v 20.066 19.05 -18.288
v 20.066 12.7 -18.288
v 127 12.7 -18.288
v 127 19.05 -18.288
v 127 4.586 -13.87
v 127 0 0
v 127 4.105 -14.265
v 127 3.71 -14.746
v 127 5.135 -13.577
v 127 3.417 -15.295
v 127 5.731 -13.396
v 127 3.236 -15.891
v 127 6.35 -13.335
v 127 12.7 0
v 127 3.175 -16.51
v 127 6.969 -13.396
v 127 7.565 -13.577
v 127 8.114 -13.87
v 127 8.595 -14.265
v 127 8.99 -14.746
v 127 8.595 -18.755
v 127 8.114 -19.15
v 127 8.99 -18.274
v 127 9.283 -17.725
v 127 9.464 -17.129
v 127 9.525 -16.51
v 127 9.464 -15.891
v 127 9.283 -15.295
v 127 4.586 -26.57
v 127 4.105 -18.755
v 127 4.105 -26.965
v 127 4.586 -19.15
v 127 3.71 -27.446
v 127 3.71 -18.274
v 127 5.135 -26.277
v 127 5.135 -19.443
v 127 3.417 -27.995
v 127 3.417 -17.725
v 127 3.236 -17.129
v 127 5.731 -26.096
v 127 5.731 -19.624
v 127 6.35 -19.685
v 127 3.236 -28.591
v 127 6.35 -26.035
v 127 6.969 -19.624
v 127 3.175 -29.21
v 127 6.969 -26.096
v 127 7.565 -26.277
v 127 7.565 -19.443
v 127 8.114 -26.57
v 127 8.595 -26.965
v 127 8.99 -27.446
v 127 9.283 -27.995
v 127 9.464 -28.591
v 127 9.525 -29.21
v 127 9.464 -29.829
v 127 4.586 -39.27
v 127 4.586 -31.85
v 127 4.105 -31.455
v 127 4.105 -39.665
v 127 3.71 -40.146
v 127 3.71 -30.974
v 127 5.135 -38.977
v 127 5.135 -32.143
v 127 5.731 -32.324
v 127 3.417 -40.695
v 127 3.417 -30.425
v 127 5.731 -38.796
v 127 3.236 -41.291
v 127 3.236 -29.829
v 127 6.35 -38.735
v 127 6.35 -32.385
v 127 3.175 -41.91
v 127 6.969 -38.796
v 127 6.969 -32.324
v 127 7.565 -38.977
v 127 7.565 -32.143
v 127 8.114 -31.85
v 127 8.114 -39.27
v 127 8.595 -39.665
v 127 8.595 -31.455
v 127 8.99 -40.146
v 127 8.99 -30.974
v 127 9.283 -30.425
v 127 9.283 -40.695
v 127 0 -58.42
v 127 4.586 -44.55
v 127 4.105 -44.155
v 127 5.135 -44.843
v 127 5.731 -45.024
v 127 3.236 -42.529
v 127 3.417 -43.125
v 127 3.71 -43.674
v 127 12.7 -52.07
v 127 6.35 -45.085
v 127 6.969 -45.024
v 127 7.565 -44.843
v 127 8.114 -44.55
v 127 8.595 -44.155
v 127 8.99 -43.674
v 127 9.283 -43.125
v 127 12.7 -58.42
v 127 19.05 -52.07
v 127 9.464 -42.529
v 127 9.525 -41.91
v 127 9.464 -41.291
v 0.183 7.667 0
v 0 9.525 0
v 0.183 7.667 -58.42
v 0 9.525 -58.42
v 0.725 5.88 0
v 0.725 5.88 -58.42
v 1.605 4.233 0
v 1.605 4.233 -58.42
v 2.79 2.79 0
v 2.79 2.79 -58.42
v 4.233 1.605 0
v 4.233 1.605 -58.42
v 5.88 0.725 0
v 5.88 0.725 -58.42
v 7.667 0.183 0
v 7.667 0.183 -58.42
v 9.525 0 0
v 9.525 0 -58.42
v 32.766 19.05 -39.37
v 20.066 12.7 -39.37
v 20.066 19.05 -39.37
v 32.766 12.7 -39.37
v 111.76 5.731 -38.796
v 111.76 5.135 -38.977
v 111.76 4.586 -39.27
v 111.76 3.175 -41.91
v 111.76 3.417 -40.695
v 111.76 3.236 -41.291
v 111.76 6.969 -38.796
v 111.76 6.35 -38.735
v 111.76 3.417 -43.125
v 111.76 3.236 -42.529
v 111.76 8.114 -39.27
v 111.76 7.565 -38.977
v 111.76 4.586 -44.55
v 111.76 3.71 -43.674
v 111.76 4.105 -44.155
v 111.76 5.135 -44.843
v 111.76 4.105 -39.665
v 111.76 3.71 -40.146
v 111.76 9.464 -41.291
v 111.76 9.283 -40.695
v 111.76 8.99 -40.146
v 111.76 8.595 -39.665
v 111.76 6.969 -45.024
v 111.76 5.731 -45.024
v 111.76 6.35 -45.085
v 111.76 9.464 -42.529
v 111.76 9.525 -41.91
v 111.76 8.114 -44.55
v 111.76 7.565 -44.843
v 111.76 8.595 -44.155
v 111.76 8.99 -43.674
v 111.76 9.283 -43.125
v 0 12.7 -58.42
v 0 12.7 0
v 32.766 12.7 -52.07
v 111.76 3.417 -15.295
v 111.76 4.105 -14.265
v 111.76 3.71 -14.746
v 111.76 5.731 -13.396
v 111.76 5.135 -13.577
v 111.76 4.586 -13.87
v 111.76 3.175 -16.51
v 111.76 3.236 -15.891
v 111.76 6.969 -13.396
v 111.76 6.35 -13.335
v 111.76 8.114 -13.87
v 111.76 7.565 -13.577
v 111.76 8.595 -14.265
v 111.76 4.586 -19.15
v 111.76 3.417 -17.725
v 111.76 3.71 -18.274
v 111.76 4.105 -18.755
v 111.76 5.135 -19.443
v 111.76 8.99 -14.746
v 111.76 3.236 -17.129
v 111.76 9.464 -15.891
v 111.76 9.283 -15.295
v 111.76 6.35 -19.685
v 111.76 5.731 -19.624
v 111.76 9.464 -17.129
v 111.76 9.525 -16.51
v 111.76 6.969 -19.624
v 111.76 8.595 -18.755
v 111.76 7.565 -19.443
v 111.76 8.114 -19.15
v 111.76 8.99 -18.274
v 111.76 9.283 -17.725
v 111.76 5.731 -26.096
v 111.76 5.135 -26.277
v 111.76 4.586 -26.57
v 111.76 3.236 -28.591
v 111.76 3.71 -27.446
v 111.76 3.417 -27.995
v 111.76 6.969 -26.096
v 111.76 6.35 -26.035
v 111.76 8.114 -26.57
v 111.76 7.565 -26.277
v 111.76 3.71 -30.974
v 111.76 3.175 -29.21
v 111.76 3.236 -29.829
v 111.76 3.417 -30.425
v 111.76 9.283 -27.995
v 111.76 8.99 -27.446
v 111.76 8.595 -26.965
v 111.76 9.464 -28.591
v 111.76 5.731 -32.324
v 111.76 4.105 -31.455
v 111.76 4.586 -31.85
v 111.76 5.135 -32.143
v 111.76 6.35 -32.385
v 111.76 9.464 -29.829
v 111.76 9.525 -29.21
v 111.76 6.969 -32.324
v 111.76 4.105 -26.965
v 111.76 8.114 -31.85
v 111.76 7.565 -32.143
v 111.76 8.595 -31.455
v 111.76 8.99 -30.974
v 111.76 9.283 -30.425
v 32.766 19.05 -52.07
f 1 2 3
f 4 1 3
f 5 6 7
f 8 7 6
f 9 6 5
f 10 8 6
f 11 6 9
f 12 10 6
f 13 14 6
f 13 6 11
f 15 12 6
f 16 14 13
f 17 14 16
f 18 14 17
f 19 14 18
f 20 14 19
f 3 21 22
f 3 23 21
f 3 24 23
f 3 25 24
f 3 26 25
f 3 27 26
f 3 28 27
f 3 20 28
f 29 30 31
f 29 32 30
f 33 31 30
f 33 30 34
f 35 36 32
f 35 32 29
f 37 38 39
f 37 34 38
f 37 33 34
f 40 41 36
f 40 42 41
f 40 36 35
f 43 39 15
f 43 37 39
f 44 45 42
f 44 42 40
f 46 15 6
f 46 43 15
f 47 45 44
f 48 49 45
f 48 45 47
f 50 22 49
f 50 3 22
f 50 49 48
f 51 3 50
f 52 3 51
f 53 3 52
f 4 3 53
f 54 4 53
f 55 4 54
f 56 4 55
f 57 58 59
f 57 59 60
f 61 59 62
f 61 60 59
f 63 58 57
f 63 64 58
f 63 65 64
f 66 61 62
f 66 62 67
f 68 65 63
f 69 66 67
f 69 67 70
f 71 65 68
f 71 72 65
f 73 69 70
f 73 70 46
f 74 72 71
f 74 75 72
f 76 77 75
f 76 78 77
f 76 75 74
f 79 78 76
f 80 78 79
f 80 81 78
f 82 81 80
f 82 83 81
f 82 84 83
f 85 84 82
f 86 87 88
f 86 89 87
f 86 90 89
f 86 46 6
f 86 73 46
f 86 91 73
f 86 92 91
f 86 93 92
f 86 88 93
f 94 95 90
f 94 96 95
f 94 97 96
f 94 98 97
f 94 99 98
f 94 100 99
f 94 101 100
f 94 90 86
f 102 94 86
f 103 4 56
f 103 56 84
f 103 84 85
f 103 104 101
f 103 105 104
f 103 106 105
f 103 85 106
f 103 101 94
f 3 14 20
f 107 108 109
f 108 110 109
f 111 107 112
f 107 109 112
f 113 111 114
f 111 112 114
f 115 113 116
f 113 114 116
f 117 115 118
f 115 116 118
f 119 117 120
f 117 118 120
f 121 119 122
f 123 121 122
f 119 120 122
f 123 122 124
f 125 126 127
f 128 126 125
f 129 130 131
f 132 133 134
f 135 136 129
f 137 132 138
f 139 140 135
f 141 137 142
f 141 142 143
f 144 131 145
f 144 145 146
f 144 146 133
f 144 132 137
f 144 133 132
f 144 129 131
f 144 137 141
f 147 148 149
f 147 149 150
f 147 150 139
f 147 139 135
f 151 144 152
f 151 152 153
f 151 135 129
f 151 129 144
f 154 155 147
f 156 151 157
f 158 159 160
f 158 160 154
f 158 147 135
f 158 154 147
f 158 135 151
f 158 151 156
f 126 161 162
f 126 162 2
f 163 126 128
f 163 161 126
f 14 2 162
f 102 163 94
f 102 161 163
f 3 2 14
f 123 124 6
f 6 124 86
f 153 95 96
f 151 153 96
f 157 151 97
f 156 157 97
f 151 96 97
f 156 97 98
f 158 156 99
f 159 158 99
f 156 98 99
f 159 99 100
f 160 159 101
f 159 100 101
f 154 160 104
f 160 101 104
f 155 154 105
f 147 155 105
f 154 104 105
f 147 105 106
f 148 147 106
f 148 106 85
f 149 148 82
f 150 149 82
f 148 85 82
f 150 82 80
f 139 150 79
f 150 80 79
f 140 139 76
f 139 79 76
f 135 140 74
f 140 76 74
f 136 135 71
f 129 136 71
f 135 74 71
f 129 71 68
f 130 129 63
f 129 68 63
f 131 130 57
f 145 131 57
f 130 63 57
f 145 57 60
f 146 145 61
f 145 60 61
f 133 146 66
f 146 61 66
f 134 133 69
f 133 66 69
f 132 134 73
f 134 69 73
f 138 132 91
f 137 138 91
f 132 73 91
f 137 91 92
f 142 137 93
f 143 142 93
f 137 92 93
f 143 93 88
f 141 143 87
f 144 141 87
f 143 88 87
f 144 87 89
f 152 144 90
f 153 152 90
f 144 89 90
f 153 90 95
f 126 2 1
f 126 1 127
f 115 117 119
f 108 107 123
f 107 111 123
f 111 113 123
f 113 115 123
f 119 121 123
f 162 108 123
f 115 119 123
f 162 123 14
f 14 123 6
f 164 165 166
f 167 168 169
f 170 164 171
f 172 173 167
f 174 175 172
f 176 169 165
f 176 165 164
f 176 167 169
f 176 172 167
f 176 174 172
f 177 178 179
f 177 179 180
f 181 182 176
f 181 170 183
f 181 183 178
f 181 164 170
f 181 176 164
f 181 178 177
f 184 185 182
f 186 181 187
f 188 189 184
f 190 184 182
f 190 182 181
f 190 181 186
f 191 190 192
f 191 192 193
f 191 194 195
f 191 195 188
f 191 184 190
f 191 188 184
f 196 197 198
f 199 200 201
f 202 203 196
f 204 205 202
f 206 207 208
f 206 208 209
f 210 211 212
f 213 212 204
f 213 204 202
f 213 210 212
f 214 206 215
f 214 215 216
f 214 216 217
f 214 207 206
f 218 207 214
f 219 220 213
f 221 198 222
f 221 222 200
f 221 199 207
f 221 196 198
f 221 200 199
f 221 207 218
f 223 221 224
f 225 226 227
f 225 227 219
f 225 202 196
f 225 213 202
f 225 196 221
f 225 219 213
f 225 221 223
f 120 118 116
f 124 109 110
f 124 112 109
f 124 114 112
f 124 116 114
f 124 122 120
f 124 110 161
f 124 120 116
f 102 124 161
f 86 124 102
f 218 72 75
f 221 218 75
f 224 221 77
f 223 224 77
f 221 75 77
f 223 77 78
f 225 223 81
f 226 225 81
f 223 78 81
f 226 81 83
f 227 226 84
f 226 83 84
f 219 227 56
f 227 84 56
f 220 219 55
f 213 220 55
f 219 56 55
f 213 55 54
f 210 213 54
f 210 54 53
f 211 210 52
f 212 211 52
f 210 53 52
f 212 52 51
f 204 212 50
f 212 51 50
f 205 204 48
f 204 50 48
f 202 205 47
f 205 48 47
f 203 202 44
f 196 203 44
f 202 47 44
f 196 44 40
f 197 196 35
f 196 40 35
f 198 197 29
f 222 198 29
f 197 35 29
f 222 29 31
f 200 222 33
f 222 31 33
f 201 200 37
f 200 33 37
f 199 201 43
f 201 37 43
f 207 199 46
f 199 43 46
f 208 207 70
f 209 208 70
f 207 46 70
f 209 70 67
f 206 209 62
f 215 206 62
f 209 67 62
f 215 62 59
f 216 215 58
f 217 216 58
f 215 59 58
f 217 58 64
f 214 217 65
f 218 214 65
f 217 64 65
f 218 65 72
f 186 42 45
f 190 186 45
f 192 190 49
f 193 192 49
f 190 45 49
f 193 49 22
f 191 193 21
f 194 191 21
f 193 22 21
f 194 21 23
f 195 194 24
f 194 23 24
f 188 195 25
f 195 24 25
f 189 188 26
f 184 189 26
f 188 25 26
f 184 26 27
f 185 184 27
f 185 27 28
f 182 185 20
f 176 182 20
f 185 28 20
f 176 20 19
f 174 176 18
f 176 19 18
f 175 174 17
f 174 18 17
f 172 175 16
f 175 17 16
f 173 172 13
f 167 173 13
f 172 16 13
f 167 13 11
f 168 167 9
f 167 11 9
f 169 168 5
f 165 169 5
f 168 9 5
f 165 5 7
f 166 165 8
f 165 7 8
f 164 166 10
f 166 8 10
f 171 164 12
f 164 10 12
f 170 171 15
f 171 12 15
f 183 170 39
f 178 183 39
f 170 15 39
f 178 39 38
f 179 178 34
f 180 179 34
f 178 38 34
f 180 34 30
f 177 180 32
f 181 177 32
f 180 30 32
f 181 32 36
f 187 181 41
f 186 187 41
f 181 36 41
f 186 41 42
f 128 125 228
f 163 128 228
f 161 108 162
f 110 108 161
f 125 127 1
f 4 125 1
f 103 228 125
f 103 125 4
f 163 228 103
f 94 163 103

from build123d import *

# Parameters (mm, degrees)
SKETCH1_W           = 254
SKETCH1_H           = 58.42
BOSS_EXTRUDE1_DEPTH = 19.05
CUT_EXTRUDE1_DEPTH  = 6.35
FILLET1_R           = 9.525
CUT_EXTRUDE2_START  = -127
SKETCH4_W           = 63.359739346
SKETCH4_H           = 23.579054397
CUT_EXTRUDE2_DEPTH  = 127
SKETCH5_R           = 3.175
CUT_EXTRUDE3_DEPTH  = 15.24
SKETCH6_W           = 12.7
SKETCH6_H           = 21.082
BOSS_EXTRUDE2_DEPTH = 6.35


with BuildPart() as part:
    # Sketch1 → Boss-Extrude1 (new body)
    with BuildSketch(Plane(origin=(0, 0, 0), x_dir=(1, 0, 0), z_dir=(0, 1, 0))):
        with Locations((127, 29.21)):
            Rectangle(SKETCH1_W, SKETCH1_H)
    extrude(amount=BOSS_EXTRUDE1_DEPTH)

    # Sketch2 → Cut-Extrude1 (cut)
    with BuildSketch(Plane(origin=(0, 19.05, 0), x_dir=(1, 0, 0), z_dir=(0, 1, 0))):
        Polygon((221.234, 52.07), (221.234, 18.288), (127, 18.288), (127, 0), (254, 0), (254, 58.42), (127, 58.42), (127, 52.07), align=None)
        Polygon((127, 0), (127, 18.288), (32.766, 18.288), (32.766, 52.07), (127, 52.07), (127, 58.42), (0, 58.42), (0, 0), align=None)
    extrude(amount=-CUT_EXTRUDE1_DEPTH, mode=Mode.SUBTRACT)

    # Fillet1
    fillet1_edges = [part.edges().sort_by_distance(p)[0] for p in [
        (254, 0, -29.21),
        (0, 0, -29.21),
    ]]
    fillet(fillet1_edges, radius=FILLET1_R)

    # Sketch4 → Cut-Extrude2 (cut)
    with BuildSketch(Plane(origin=(254, 0, 0), x_dir=(0, 0, -1), z_dir=(1, 0, 0)).offset(CUT_EXTRUDE2_START)):
        with Locations((31.679869673, 11.789527199)):
            Rectangle(SKETCH4_W, SKETCH4_H)
    extrude(amount=CUT_EXTRUDE2_DEPTH, mode=Mode.SUBTRACT)

    # Sketch5 → Cut-Extrude3 (cut)
    with BuildSketch(Plane(origin=(127, 0, 0), x_dir=(0, 0, -1), z_dir=(1, 0, 0))):
        with Locations((16.51, 6.35)):
            Circle(SKETCH5_R)
        with Locations((29.21, 6.35)):
            Circle(SKETCH5_R)
        with Locations((41.91, 6.35)):
            Circle(SKETCH5_R)
    extrude(amount=-CUT_EXTRUDE3_DEPTH, mode=Mode.SUBTRACT)

    # Sketch6 → Boss-Extrude2 (add)
    with BuildSketch(Plane(origin=(0, 12.7, 0), x_dir=(1, 0, 0), z_dir=(0, 1, 0))):
        with Locations((26.416, 28.829)):
            Rectangle(SKETCH6_W, SKETCH6_H)
    extrude(amount=BOSS_EXTRUDE2_DEPTH)


solid = part.part
